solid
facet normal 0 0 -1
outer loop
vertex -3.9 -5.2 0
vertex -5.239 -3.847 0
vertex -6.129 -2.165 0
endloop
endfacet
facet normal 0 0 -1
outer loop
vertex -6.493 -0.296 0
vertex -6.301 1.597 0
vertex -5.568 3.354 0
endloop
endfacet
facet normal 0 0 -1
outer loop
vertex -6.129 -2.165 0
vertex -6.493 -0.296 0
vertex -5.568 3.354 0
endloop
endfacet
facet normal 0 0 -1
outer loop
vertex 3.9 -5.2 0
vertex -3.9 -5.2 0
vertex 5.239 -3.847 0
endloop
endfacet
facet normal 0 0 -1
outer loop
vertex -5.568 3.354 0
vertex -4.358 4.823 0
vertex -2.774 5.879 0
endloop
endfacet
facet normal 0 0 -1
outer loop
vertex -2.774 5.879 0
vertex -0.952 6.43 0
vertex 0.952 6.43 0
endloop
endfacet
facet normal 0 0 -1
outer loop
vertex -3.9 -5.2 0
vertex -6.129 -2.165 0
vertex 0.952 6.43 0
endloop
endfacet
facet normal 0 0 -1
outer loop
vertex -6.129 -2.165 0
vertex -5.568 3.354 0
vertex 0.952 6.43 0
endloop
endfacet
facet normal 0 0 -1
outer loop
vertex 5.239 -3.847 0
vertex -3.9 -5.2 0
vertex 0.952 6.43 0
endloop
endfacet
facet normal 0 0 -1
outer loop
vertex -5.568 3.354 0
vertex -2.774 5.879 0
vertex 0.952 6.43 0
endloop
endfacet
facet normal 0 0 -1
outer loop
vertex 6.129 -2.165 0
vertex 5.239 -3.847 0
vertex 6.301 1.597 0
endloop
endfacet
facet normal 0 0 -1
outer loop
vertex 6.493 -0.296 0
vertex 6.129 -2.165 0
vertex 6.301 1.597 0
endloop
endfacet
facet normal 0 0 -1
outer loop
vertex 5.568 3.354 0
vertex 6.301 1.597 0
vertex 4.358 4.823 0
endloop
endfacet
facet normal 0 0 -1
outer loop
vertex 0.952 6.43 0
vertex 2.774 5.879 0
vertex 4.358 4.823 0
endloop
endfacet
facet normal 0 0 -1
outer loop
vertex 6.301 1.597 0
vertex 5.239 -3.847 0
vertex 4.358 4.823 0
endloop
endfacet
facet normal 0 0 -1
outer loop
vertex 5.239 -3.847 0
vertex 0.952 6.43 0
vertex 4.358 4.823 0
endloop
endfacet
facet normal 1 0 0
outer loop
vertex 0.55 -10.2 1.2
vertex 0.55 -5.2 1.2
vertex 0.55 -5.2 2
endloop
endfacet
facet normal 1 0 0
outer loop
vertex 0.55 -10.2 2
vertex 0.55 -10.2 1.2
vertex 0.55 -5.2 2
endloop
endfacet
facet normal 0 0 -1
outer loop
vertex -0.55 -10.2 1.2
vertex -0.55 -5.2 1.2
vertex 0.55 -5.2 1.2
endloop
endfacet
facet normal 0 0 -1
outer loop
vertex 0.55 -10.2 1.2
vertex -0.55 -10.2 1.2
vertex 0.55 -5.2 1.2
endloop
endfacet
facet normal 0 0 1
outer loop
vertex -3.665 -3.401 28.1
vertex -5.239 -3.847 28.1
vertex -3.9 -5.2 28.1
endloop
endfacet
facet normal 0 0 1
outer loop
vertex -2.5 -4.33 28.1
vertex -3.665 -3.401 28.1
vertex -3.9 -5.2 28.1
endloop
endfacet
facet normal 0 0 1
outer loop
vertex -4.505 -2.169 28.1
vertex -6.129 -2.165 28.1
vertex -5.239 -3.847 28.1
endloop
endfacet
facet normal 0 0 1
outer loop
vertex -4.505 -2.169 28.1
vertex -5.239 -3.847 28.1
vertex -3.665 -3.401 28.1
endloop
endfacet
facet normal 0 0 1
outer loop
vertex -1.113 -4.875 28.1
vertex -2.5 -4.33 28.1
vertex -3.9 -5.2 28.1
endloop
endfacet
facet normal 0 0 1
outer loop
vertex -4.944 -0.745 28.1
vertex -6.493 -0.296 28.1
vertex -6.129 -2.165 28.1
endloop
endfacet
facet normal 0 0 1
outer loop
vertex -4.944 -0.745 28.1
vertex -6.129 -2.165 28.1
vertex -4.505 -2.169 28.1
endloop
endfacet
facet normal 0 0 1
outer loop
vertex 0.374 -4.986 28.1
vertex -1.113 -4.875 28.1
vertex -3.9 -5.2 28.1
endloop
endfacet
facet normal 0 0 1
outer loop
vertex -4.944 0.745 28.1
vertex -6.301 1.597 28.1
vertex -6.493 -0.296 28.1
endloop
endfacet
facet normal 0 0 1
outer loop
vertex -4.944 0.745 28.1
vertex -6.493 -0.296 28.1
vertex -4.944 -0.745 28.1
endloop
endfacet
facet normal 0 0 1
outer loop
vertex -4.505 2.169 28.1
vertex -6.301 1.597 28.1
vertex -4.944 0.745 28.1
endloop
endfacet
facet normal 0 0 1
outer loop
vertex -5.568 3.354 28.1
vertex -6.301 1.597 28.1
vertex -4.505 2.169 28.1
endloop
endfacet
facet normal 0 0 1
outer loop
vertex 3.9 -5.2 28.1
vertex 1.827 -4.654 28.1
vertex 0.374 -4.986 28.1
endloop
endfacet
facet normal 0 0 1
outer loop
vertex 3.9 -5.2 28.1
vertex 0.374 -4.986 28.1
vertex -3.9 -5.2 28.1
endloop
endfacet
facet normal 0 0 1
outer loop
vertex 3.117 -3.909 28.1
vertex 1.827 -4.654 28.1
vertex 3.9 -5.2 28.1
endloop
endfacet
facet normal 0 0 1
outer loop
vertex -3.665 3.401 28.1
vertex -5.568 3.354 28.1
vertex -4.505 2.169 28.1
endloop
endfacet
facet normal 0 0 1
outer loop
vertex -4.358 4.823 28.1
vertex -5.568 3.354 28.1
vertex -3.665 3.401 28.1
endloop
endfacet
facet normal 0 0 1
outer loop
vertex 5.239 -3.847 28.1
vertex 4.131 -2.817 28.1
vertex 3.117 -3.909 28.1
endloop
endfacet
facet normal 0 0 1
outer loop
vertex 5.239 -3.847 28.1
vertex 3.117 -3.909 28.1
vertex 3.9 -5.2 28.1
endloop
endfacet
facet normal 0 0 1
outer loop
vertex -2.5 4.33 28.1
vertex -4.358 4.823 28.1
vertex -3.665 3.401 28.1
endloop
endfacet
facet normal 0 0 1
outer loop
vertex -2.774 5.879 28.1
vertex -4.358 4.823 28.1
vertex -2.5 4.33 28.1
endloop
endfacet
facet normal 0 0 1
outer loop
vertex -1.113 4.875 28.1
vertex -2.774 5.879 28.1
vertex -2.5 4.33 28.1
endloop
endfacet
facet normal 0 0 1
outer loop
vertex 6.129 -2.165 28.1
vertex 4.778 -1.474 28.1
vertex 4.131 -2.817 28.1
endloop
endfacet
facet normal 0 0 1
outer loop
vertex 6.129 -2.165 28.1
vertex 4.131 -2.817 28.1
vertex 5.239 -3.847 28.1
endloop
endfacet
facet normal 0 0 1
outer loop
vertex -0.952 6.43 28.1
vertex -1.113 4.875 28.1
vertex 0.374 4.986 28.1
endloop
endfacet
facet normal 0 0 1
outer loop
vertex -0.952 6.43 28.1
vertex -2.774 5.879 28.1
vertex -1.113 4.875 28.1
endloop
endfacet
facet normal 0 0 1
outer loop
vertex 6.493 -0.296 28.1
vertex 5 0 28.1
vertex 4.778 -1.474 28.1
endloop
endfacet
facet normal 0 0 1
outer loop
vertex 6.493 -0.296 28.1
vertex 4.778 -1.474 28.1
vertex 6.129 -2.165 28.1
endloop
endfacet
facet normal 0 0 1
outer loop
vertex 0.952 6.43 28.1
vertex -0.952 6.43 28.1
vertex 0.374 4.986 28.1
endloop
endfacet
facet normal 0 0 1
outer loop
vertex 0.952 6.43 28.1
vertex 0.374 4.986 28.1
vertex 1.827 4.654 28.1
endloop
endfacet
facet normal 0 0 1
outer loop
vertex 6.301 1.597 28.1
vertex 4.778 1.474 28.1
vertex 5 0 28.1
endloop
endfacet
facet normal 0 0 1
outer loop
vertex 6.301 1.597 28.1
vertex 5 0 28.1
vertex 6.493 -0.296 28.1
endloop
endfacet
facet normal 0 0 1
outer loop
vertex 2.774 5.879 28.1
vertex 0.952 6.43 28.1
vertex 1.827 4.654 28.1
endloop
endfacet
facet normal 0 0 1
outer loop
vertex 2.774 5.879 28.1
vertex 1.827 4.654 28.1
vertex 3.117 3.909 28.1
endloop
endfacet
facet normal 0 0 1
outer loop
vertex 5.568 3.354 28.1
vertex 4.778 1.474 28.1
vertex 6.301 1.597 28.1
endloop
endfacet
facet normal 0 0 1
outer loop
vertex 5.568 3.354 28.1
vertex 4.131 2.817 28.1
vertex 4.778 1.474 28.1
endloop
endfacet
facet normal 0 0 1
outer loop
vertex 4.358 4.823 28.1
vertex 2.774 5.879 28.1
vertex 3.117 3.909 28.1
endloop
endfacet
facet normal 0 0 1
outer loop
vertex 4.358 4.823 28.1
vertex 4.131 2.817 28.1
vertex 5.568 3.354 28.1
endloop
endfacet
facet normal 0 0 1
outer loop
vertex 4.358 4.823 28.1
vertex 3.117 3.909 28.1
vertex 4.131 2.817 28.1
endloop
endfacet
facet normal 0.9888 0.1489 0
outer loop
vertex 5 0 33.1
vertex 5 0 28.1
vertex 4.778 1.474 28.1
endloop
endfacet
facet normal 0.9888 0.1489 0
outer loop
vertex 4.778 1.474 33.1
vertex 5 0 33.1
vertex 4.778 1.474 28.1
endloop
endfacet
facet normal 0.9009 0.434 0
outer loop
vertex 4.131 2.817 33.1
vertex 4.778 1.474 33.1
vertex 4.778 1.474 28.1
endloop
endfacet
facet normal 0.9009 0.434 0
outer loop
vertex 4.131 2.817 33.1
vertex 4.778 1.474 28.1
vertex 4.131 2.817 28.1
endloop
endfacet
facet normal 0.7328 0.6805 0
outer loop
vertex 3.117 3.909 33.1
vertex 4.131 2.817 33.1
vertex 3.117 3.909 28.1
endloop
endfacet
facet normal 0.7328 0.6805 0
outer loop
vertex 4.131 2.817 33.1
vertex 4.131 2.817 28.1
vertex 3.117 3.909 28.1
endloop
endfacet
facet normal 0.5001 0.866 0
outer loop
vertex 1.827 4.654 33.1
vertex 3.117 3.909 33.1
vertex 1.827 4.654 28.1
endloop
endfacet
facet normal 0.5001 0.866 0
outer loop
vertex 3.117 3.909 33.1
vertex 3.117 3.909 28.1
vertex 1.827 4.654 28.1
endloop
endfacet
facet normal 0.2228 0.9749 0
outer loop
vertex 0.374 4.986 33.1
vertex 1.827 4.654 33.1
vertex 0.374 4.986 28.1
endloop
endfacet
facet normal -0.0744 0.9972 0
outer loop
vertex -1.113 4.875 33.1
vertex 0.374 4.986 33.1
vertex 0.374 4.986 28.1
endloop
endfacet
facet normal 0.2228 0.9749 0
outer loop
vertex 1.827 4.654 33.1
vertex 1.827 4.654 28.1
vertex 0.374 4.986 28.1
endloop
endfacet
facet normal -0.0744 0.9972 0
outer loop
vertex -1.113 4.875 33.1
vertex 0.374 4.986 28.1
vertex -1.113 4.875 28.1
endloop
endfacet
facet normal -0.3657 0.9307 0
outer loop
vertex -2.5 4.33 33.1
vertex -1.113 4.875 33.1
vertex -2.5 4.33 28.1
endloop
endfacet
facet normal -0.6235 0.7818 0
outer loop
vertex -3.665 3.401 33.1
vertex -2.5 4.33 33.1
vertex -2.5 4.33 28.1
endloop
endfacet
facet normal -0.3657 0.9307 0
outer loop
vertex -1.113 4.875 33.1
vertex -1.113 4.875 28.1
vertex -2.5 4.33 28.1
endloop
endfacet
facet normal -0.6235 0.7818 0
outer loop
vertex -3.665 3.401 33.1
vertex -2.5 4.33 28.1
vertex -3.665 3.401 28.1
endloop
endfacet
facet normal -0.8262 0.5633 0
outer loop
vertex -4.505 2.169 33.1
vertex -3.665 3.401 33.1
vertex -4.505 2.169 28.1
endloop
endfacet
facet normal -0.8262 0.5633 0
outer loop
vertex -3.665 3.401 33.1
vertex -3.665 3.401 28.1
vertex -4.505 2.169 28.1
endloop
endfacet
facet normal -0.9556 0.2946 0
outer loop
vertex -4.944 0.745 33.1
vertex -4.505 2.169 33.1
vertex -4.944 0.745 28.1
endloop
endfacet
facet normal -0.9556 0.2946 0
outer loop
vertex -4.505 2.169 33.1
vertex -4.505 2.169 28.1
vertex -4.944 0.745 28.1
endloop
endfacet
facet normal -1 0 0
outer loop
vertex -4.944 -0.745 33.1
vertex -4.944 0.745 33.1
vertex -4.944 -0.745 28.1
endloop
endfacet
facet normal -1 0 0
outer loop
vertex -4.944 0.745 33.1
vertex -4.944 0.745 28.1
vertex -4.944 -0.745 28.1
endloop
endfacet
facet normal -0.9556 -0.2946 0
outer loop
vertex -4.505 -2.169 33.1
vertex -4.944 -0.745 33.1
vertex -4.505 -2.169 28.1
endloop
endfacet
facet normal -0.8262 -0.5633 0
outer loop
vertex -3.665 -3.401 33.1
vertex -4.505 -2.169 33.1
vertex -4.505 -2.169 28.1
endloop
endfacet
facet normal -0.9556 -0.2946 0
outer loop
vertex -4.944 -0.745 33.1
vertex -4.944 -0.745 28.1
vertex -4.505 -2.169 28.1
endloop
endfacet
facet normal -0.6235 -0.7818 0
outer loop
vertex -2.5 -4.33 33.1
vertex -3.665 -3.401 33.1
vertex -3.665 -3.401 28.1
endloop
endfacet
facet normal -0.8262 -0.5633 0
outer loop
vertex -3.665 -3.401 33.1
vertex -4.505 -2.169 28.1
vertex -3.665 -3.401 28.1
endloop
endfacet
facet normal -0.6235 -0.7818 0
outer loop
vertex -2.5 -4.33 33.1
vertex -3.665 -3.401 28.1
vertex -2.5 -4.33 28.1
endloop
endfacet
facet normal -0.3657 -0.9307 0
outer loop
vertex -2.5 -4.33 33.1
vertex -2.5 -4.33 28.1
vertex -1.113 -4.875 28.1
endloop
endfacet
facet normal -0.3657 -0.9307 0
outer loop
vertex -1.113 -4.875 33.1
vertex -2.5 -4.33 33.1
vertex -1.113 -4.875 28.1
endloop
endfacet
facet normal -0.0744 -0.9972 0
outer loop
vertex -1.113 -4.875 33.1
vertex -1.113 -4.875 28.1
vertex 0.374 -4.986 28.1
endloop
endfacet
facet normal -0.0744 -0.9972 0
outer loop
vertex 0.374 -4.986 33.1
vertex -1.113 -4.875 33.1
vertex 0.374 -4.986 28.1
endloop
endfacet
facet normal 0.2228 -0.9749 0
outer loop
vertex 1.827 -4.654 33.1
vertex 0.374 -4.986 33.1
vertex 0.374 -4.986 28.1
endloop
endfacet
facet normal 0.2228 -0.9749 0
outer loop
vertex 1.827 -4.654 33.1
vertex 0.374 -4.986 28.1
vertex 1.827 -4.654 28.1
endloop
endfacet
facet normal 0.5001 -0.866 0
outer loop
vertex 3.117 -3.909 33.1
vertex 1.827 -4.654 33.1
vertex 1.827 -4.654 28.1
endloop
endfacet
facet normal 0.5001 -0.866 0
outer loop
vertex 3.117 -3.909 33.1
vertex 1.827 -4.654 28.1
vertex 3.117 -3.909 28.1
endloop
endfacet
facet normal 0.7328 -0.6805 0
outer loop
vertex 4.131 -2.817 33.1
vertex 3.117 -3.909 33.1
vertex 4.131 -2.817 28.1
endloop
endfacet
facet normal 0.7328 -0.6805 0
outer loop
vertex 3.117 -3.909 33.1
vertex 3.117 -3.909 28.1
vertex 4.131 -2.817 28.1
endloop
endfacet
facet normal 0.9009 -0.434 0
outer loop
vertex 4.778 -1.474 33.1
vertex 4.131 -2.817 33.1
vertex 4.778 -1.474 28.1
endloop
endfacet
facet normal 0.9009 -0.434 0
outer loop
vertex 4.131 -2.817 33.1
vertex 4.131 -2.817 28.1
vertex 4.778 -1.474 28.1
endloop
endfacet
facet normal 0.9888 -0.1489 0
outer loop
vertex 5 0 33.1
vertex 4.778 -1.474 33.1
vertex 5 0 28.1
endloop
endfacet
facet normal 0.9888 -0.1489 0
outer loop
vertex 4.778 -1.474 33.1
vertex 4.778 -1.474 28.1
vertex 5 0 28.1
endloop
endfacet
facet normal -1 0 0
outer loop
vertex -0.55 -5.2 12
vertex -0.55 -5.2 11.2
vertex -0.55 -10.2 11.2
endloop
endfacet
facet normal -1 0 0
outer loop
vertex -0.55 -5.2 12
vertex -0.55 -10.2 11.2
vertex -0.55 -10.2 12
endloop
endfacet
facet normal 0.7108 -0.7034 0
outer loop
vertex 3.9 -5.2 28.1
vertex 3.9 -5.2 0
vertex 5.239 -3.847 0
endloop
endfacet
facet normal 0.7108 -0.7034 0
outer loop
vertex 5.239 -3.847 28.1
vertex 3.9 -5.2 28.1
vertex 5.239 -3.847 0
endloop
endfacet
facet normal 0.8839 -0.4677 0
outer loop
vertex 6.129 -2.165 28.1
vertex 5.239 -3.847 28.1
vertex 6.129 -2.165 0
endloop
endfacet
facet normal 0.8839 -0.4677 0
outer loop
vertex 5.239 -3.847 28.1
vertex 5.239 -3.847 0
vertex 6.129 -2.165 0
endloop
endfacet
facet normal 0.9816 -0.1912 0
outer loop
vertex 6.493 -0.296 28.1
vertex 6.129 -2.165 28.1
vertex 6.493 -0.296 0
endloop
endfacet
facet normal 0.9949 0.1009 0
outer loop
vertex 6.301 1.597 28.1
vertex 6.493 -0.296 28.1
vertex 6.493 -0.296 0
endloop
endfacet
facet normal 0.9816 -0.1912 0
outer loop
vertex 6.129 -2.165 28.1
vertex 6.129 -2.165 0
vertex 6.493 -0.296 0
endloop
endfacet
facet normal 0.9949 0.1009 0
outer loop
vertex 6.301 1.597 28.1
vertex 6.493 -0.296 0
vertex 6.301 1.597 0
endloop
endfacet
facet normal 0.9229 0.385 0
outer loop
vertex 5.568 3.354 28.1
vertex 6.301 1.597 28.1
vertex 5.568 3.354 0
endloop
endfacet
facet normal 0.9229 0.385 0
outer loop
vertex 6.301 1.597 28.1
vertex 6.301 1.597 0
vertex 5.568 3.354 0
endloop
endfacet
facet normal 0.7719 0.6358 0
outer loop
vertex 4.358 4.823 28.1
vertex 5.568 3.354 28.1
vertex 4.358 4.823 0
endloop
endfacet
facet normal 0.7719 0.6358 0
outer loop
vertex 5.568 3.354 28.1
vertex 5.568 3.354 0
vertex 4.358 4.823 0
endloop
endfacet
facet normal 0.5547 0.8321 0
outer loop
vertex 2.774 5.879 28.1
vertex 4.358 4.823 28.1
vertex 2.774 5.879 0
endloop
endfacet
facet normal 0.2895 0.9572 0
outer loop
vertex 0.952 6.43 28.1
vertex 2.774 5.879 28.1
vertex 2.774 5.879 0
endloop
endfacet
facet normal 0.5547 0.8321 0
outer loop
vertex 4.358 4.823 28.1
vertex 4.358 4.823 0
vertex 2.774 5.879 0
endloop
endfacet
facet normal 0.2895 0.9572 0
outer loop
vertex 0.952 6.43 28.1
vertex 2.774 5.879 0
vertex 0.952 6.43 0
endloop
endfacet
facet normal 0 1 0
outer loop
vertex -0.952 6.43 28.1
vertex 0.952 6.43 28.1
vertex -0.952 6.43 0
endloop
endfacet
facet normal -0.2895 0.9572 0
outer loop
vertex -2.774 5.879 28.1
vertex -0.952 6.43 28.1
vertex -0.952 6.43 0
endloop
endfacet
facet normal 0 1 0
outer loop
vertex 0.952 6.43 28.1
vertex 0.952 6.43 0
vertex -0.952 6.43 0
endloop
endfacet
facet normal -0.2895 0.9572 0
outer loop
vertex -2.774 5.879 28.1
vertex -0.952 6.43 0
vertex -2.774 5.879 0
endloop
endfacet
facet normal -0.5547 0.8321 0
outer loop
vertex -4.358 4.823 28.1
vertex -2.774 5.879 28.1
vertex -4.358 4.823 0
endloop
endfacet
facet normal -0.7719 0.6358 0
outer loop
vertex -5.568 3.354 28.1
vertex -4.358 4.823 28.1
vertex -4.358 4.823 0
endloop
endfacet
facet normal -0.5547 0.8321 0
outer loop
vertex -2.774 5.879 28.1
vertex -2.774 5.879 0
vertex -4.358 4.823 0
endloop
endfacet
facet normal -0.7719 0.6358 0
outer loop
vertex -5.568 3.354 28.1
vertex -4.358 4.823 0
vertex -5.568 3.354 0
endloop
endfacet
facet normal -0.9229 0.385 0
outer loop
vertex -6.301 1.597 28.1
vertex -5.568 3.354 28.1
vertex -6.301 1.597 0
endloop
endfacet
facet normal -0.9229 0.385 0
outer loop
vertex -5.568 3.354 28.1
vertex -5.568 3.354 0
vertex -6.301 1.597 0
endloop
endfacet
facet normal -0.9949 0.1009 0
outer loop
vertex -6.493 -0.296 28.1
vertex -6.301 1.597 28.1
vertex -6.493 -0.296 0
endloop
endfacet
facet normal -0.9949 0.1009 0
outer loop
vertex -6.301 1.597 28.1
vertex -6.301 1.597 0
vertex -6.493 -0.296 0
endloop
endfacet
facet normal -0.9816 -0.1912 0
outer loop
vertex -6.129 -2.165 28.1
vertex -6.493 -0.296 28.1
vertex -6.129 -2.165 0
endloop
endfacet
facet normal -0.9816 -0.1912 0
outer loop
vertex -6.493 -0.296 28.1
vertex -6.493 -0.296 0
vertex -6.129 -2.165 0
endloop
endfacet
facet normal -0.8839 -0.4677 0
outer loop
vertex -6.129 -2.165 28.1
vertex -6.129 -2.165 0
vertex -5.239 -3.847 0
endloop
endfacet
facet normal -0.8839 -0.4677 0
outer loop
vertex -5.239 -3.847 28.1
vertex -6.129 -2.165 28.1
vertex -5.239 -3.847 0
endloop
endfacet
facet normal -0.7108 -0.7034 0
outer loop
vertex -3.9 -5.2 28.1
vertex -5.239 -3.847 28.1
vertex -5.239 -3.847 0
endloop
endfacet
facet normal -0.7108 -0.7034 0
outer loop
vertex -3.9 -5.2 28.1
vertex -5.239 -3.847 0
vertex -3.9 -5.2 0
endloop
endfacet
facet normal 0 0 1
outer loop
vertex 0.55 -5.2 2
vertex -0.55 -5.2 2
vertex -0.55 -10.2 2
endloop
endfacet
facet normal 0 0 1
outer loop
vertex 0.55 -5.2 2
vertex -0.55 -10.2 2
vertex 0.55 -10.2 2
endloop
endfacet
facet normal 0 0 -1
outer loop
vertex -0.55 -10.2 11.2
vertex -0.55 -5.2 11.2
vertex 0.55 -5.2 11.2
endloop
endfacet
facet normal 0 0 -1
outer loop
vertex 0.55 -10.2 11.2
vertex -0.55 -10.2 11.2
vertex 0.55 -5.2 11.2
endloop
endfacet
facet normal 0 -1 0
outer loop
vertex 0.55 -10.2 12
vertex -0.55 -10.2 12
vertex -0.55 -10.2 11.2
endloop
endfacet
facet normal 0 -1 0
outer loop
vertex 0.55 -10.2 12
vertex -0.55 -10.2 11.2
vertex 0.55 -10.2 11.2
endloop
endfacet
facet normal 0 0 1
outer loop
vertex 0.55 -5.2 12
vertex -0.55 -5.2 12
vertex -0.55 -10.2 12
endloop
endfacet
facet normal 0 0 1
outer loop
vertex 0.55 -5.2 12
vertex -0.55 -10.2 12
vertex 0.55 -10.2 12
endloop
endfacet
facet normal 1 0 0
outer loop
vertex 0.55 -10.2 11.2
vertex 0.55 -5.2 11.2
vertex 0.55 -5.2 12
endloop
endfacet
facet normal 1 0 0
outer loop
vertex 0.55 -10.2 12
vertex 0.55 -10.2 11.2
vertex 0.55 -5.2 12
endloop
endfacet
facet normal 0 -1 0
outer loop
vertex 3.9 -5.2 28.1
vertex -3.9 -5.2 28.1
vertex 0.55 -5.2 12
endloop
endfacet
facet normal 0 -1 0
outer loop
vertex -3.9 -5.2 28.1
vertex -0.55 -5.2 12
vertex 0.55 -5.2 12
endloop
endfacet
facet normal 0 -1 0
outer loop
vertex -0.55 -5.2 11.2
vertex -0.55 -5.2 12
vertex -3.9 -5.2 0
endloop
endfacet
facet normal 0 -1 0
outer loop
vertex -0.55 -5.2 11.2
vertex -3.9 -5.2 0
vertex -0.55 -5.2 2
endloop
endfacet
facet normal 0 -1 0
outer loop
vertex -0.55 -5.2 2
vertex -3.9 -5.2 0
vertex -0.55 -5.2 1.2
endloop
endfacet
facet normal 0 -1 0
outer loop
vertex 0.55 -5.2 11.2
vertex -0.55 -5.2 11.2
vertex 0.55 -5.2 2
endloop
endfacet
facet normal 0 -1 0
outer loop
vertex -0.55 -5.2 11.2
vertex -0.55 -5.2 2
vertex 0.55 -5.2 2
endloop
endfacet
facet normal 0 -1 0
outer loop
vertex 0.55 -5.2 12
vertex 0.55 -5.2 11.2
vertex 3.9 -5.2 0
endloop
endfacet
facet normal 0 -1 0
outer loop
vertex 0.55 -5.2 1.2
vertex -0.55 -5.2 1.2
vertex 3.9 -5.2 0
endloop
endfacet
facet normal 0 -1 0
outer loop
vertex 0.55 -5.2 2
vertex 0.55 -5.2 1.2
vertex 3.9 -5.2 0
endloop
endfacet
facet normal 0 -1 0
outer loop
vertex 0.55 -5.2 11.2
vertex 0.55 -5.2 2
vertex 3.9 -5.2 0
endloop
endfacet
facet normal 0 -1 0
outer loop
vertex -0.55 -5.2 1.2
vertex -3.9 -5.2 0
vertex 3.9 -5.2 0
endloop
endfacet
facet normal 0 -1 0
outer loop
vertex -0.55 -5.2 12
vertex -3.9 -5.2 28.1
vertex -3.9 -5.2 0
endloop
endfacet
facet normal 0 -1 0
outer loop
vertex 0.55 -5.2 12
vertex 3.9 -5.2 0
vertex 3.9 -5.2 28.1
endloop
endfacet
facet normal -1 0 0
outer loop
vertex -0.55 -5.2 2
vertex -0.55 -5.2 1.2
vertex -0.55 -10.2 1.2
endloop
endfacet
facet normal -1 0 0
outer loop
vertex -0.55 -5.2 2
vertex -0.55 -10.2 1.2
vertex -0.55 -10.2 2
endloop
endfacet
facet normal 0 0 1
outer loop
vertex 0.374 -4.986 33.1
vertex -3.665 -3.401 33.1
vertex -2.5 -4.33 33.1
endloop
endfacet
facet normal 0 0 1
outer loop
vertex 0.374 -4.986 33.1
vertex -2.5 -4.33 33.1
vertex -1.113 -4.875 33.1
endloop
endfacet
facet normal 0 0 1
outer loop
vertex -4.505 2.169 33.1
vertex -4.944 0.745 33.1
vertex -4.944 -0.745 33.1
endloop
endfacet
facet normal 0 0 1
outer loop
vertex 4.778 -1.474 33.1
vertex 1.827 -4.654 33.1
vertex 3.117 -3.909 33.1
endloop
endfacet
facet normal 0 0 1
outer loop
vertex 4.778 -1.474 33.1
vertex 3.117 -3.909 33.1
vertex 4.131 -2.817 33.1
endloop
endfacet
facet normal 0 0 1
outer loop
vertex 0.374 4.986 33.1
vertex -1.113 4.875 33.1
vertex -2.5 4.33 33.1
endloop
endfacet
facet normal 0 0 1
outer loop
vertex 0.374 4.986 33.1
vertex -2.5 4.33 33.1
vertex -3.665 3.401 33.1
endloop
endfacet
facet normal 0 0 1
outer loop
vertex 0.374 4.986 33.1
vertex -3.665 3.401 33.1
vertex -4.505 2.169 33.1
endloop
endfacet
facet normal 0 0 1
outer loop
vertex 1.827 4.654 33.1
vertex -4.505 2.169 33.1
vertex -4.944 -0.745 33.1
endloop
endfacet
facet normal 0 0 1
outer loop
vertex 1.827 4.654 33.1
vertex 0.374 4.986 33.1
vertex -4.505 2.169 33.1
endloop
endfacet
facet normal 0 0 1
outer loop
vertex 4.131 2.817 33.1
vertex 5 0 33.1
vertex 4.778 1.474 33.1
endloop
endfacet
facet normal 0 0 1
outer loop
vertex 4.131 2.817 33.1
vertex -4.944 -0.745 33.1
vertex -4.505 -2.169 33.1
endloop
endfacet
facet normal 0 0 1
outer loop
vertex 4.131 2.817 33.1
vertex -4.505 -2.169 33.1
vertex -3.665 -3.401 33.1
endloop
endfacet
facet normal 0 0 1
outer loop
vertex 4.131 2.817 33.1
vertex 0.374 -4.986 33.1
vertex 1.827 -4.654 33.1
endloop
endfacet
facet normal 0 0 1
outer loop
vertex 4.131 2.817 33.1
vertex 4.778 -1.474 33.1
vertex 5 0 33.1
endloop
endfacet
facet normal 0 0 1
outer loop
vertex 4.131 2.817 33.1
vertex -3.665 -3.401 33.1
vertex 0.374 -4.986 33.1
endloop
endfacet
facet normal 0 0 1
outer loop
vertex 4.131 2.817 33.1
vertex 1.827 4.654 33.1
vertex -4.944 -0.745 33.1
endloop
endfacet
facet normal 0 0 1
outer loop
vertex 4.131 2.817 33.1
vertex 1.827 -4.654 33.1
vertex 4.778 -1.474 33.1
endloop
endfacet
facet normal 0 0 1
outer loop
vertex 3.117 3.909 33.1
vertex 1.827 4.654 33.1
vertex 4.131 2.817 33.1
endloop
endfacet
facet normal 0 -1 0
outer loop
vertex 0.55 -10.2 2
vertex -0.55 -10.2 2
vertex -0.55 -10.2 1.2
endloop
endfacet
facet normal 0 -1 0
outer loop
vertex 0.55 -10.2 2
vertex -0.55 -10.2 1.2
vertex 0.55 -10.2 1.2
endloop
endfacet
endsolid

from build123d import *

# Parameters (mm, degrees)
EXTRUDE_1_DEPTH     = 33.1
CUT_EXTRUDE_START   = -5
SKETCH_2_R          = 5
CUT_EXTRUDE_1_DEPTH = 5
SKETCH_3_W          = 1.1
SKETCH_3_H          = 0.8
EXTRUDE_2_DEPTH     = 5


with BuildPart() as part:
    # 草图1 → 凸台-拉伸1 (new body)
    with BuildSketch(Plane.XY):
        with BuildLine():
            Line((-3.9, -5.2), (3.9, -5.2))
            ThreePointArc((3.9, -5.2), (0, 6.5), (-3.9, -5.2))
        make_face()
    extrude(amount=EXTRUDE_1_DEPTH)

    # 草图2 → 切除-拉伸1 (cut)
    with BuildSketch(Plane.XY.offset(33.1).offset(CUT_EXTRUDE_START)):
        with BuildLine():
            Line((-3.9, -5.2), (3.9, -5.2))
            ThreePointArc((3.9, -5.2), (0, 6.5), (-3.9, -5.2))
        make_face()
        Circle(SKETCH_2_R, mode=Mode.SUBTRACT)
    extrude(amount=CUT_EXTRUDE_1_DEPTH, mode=Mode.SUBTRACT)

    # 草图3 → 凸台-拉伸2 (add)
    with BuildSketch(Plane.XZ.offset(5.2)):
        with Locations((0, 11.6)):
            Rectangle(SKETCH_3_W, SKETCH_3_H)
        with Locations((0, 1.6)):
            Rectangle(SKETCH_3_W, SKETCH_3_H)
    extrude(amount=EXTRUDE_2_DEPTH)


solid = part.part
